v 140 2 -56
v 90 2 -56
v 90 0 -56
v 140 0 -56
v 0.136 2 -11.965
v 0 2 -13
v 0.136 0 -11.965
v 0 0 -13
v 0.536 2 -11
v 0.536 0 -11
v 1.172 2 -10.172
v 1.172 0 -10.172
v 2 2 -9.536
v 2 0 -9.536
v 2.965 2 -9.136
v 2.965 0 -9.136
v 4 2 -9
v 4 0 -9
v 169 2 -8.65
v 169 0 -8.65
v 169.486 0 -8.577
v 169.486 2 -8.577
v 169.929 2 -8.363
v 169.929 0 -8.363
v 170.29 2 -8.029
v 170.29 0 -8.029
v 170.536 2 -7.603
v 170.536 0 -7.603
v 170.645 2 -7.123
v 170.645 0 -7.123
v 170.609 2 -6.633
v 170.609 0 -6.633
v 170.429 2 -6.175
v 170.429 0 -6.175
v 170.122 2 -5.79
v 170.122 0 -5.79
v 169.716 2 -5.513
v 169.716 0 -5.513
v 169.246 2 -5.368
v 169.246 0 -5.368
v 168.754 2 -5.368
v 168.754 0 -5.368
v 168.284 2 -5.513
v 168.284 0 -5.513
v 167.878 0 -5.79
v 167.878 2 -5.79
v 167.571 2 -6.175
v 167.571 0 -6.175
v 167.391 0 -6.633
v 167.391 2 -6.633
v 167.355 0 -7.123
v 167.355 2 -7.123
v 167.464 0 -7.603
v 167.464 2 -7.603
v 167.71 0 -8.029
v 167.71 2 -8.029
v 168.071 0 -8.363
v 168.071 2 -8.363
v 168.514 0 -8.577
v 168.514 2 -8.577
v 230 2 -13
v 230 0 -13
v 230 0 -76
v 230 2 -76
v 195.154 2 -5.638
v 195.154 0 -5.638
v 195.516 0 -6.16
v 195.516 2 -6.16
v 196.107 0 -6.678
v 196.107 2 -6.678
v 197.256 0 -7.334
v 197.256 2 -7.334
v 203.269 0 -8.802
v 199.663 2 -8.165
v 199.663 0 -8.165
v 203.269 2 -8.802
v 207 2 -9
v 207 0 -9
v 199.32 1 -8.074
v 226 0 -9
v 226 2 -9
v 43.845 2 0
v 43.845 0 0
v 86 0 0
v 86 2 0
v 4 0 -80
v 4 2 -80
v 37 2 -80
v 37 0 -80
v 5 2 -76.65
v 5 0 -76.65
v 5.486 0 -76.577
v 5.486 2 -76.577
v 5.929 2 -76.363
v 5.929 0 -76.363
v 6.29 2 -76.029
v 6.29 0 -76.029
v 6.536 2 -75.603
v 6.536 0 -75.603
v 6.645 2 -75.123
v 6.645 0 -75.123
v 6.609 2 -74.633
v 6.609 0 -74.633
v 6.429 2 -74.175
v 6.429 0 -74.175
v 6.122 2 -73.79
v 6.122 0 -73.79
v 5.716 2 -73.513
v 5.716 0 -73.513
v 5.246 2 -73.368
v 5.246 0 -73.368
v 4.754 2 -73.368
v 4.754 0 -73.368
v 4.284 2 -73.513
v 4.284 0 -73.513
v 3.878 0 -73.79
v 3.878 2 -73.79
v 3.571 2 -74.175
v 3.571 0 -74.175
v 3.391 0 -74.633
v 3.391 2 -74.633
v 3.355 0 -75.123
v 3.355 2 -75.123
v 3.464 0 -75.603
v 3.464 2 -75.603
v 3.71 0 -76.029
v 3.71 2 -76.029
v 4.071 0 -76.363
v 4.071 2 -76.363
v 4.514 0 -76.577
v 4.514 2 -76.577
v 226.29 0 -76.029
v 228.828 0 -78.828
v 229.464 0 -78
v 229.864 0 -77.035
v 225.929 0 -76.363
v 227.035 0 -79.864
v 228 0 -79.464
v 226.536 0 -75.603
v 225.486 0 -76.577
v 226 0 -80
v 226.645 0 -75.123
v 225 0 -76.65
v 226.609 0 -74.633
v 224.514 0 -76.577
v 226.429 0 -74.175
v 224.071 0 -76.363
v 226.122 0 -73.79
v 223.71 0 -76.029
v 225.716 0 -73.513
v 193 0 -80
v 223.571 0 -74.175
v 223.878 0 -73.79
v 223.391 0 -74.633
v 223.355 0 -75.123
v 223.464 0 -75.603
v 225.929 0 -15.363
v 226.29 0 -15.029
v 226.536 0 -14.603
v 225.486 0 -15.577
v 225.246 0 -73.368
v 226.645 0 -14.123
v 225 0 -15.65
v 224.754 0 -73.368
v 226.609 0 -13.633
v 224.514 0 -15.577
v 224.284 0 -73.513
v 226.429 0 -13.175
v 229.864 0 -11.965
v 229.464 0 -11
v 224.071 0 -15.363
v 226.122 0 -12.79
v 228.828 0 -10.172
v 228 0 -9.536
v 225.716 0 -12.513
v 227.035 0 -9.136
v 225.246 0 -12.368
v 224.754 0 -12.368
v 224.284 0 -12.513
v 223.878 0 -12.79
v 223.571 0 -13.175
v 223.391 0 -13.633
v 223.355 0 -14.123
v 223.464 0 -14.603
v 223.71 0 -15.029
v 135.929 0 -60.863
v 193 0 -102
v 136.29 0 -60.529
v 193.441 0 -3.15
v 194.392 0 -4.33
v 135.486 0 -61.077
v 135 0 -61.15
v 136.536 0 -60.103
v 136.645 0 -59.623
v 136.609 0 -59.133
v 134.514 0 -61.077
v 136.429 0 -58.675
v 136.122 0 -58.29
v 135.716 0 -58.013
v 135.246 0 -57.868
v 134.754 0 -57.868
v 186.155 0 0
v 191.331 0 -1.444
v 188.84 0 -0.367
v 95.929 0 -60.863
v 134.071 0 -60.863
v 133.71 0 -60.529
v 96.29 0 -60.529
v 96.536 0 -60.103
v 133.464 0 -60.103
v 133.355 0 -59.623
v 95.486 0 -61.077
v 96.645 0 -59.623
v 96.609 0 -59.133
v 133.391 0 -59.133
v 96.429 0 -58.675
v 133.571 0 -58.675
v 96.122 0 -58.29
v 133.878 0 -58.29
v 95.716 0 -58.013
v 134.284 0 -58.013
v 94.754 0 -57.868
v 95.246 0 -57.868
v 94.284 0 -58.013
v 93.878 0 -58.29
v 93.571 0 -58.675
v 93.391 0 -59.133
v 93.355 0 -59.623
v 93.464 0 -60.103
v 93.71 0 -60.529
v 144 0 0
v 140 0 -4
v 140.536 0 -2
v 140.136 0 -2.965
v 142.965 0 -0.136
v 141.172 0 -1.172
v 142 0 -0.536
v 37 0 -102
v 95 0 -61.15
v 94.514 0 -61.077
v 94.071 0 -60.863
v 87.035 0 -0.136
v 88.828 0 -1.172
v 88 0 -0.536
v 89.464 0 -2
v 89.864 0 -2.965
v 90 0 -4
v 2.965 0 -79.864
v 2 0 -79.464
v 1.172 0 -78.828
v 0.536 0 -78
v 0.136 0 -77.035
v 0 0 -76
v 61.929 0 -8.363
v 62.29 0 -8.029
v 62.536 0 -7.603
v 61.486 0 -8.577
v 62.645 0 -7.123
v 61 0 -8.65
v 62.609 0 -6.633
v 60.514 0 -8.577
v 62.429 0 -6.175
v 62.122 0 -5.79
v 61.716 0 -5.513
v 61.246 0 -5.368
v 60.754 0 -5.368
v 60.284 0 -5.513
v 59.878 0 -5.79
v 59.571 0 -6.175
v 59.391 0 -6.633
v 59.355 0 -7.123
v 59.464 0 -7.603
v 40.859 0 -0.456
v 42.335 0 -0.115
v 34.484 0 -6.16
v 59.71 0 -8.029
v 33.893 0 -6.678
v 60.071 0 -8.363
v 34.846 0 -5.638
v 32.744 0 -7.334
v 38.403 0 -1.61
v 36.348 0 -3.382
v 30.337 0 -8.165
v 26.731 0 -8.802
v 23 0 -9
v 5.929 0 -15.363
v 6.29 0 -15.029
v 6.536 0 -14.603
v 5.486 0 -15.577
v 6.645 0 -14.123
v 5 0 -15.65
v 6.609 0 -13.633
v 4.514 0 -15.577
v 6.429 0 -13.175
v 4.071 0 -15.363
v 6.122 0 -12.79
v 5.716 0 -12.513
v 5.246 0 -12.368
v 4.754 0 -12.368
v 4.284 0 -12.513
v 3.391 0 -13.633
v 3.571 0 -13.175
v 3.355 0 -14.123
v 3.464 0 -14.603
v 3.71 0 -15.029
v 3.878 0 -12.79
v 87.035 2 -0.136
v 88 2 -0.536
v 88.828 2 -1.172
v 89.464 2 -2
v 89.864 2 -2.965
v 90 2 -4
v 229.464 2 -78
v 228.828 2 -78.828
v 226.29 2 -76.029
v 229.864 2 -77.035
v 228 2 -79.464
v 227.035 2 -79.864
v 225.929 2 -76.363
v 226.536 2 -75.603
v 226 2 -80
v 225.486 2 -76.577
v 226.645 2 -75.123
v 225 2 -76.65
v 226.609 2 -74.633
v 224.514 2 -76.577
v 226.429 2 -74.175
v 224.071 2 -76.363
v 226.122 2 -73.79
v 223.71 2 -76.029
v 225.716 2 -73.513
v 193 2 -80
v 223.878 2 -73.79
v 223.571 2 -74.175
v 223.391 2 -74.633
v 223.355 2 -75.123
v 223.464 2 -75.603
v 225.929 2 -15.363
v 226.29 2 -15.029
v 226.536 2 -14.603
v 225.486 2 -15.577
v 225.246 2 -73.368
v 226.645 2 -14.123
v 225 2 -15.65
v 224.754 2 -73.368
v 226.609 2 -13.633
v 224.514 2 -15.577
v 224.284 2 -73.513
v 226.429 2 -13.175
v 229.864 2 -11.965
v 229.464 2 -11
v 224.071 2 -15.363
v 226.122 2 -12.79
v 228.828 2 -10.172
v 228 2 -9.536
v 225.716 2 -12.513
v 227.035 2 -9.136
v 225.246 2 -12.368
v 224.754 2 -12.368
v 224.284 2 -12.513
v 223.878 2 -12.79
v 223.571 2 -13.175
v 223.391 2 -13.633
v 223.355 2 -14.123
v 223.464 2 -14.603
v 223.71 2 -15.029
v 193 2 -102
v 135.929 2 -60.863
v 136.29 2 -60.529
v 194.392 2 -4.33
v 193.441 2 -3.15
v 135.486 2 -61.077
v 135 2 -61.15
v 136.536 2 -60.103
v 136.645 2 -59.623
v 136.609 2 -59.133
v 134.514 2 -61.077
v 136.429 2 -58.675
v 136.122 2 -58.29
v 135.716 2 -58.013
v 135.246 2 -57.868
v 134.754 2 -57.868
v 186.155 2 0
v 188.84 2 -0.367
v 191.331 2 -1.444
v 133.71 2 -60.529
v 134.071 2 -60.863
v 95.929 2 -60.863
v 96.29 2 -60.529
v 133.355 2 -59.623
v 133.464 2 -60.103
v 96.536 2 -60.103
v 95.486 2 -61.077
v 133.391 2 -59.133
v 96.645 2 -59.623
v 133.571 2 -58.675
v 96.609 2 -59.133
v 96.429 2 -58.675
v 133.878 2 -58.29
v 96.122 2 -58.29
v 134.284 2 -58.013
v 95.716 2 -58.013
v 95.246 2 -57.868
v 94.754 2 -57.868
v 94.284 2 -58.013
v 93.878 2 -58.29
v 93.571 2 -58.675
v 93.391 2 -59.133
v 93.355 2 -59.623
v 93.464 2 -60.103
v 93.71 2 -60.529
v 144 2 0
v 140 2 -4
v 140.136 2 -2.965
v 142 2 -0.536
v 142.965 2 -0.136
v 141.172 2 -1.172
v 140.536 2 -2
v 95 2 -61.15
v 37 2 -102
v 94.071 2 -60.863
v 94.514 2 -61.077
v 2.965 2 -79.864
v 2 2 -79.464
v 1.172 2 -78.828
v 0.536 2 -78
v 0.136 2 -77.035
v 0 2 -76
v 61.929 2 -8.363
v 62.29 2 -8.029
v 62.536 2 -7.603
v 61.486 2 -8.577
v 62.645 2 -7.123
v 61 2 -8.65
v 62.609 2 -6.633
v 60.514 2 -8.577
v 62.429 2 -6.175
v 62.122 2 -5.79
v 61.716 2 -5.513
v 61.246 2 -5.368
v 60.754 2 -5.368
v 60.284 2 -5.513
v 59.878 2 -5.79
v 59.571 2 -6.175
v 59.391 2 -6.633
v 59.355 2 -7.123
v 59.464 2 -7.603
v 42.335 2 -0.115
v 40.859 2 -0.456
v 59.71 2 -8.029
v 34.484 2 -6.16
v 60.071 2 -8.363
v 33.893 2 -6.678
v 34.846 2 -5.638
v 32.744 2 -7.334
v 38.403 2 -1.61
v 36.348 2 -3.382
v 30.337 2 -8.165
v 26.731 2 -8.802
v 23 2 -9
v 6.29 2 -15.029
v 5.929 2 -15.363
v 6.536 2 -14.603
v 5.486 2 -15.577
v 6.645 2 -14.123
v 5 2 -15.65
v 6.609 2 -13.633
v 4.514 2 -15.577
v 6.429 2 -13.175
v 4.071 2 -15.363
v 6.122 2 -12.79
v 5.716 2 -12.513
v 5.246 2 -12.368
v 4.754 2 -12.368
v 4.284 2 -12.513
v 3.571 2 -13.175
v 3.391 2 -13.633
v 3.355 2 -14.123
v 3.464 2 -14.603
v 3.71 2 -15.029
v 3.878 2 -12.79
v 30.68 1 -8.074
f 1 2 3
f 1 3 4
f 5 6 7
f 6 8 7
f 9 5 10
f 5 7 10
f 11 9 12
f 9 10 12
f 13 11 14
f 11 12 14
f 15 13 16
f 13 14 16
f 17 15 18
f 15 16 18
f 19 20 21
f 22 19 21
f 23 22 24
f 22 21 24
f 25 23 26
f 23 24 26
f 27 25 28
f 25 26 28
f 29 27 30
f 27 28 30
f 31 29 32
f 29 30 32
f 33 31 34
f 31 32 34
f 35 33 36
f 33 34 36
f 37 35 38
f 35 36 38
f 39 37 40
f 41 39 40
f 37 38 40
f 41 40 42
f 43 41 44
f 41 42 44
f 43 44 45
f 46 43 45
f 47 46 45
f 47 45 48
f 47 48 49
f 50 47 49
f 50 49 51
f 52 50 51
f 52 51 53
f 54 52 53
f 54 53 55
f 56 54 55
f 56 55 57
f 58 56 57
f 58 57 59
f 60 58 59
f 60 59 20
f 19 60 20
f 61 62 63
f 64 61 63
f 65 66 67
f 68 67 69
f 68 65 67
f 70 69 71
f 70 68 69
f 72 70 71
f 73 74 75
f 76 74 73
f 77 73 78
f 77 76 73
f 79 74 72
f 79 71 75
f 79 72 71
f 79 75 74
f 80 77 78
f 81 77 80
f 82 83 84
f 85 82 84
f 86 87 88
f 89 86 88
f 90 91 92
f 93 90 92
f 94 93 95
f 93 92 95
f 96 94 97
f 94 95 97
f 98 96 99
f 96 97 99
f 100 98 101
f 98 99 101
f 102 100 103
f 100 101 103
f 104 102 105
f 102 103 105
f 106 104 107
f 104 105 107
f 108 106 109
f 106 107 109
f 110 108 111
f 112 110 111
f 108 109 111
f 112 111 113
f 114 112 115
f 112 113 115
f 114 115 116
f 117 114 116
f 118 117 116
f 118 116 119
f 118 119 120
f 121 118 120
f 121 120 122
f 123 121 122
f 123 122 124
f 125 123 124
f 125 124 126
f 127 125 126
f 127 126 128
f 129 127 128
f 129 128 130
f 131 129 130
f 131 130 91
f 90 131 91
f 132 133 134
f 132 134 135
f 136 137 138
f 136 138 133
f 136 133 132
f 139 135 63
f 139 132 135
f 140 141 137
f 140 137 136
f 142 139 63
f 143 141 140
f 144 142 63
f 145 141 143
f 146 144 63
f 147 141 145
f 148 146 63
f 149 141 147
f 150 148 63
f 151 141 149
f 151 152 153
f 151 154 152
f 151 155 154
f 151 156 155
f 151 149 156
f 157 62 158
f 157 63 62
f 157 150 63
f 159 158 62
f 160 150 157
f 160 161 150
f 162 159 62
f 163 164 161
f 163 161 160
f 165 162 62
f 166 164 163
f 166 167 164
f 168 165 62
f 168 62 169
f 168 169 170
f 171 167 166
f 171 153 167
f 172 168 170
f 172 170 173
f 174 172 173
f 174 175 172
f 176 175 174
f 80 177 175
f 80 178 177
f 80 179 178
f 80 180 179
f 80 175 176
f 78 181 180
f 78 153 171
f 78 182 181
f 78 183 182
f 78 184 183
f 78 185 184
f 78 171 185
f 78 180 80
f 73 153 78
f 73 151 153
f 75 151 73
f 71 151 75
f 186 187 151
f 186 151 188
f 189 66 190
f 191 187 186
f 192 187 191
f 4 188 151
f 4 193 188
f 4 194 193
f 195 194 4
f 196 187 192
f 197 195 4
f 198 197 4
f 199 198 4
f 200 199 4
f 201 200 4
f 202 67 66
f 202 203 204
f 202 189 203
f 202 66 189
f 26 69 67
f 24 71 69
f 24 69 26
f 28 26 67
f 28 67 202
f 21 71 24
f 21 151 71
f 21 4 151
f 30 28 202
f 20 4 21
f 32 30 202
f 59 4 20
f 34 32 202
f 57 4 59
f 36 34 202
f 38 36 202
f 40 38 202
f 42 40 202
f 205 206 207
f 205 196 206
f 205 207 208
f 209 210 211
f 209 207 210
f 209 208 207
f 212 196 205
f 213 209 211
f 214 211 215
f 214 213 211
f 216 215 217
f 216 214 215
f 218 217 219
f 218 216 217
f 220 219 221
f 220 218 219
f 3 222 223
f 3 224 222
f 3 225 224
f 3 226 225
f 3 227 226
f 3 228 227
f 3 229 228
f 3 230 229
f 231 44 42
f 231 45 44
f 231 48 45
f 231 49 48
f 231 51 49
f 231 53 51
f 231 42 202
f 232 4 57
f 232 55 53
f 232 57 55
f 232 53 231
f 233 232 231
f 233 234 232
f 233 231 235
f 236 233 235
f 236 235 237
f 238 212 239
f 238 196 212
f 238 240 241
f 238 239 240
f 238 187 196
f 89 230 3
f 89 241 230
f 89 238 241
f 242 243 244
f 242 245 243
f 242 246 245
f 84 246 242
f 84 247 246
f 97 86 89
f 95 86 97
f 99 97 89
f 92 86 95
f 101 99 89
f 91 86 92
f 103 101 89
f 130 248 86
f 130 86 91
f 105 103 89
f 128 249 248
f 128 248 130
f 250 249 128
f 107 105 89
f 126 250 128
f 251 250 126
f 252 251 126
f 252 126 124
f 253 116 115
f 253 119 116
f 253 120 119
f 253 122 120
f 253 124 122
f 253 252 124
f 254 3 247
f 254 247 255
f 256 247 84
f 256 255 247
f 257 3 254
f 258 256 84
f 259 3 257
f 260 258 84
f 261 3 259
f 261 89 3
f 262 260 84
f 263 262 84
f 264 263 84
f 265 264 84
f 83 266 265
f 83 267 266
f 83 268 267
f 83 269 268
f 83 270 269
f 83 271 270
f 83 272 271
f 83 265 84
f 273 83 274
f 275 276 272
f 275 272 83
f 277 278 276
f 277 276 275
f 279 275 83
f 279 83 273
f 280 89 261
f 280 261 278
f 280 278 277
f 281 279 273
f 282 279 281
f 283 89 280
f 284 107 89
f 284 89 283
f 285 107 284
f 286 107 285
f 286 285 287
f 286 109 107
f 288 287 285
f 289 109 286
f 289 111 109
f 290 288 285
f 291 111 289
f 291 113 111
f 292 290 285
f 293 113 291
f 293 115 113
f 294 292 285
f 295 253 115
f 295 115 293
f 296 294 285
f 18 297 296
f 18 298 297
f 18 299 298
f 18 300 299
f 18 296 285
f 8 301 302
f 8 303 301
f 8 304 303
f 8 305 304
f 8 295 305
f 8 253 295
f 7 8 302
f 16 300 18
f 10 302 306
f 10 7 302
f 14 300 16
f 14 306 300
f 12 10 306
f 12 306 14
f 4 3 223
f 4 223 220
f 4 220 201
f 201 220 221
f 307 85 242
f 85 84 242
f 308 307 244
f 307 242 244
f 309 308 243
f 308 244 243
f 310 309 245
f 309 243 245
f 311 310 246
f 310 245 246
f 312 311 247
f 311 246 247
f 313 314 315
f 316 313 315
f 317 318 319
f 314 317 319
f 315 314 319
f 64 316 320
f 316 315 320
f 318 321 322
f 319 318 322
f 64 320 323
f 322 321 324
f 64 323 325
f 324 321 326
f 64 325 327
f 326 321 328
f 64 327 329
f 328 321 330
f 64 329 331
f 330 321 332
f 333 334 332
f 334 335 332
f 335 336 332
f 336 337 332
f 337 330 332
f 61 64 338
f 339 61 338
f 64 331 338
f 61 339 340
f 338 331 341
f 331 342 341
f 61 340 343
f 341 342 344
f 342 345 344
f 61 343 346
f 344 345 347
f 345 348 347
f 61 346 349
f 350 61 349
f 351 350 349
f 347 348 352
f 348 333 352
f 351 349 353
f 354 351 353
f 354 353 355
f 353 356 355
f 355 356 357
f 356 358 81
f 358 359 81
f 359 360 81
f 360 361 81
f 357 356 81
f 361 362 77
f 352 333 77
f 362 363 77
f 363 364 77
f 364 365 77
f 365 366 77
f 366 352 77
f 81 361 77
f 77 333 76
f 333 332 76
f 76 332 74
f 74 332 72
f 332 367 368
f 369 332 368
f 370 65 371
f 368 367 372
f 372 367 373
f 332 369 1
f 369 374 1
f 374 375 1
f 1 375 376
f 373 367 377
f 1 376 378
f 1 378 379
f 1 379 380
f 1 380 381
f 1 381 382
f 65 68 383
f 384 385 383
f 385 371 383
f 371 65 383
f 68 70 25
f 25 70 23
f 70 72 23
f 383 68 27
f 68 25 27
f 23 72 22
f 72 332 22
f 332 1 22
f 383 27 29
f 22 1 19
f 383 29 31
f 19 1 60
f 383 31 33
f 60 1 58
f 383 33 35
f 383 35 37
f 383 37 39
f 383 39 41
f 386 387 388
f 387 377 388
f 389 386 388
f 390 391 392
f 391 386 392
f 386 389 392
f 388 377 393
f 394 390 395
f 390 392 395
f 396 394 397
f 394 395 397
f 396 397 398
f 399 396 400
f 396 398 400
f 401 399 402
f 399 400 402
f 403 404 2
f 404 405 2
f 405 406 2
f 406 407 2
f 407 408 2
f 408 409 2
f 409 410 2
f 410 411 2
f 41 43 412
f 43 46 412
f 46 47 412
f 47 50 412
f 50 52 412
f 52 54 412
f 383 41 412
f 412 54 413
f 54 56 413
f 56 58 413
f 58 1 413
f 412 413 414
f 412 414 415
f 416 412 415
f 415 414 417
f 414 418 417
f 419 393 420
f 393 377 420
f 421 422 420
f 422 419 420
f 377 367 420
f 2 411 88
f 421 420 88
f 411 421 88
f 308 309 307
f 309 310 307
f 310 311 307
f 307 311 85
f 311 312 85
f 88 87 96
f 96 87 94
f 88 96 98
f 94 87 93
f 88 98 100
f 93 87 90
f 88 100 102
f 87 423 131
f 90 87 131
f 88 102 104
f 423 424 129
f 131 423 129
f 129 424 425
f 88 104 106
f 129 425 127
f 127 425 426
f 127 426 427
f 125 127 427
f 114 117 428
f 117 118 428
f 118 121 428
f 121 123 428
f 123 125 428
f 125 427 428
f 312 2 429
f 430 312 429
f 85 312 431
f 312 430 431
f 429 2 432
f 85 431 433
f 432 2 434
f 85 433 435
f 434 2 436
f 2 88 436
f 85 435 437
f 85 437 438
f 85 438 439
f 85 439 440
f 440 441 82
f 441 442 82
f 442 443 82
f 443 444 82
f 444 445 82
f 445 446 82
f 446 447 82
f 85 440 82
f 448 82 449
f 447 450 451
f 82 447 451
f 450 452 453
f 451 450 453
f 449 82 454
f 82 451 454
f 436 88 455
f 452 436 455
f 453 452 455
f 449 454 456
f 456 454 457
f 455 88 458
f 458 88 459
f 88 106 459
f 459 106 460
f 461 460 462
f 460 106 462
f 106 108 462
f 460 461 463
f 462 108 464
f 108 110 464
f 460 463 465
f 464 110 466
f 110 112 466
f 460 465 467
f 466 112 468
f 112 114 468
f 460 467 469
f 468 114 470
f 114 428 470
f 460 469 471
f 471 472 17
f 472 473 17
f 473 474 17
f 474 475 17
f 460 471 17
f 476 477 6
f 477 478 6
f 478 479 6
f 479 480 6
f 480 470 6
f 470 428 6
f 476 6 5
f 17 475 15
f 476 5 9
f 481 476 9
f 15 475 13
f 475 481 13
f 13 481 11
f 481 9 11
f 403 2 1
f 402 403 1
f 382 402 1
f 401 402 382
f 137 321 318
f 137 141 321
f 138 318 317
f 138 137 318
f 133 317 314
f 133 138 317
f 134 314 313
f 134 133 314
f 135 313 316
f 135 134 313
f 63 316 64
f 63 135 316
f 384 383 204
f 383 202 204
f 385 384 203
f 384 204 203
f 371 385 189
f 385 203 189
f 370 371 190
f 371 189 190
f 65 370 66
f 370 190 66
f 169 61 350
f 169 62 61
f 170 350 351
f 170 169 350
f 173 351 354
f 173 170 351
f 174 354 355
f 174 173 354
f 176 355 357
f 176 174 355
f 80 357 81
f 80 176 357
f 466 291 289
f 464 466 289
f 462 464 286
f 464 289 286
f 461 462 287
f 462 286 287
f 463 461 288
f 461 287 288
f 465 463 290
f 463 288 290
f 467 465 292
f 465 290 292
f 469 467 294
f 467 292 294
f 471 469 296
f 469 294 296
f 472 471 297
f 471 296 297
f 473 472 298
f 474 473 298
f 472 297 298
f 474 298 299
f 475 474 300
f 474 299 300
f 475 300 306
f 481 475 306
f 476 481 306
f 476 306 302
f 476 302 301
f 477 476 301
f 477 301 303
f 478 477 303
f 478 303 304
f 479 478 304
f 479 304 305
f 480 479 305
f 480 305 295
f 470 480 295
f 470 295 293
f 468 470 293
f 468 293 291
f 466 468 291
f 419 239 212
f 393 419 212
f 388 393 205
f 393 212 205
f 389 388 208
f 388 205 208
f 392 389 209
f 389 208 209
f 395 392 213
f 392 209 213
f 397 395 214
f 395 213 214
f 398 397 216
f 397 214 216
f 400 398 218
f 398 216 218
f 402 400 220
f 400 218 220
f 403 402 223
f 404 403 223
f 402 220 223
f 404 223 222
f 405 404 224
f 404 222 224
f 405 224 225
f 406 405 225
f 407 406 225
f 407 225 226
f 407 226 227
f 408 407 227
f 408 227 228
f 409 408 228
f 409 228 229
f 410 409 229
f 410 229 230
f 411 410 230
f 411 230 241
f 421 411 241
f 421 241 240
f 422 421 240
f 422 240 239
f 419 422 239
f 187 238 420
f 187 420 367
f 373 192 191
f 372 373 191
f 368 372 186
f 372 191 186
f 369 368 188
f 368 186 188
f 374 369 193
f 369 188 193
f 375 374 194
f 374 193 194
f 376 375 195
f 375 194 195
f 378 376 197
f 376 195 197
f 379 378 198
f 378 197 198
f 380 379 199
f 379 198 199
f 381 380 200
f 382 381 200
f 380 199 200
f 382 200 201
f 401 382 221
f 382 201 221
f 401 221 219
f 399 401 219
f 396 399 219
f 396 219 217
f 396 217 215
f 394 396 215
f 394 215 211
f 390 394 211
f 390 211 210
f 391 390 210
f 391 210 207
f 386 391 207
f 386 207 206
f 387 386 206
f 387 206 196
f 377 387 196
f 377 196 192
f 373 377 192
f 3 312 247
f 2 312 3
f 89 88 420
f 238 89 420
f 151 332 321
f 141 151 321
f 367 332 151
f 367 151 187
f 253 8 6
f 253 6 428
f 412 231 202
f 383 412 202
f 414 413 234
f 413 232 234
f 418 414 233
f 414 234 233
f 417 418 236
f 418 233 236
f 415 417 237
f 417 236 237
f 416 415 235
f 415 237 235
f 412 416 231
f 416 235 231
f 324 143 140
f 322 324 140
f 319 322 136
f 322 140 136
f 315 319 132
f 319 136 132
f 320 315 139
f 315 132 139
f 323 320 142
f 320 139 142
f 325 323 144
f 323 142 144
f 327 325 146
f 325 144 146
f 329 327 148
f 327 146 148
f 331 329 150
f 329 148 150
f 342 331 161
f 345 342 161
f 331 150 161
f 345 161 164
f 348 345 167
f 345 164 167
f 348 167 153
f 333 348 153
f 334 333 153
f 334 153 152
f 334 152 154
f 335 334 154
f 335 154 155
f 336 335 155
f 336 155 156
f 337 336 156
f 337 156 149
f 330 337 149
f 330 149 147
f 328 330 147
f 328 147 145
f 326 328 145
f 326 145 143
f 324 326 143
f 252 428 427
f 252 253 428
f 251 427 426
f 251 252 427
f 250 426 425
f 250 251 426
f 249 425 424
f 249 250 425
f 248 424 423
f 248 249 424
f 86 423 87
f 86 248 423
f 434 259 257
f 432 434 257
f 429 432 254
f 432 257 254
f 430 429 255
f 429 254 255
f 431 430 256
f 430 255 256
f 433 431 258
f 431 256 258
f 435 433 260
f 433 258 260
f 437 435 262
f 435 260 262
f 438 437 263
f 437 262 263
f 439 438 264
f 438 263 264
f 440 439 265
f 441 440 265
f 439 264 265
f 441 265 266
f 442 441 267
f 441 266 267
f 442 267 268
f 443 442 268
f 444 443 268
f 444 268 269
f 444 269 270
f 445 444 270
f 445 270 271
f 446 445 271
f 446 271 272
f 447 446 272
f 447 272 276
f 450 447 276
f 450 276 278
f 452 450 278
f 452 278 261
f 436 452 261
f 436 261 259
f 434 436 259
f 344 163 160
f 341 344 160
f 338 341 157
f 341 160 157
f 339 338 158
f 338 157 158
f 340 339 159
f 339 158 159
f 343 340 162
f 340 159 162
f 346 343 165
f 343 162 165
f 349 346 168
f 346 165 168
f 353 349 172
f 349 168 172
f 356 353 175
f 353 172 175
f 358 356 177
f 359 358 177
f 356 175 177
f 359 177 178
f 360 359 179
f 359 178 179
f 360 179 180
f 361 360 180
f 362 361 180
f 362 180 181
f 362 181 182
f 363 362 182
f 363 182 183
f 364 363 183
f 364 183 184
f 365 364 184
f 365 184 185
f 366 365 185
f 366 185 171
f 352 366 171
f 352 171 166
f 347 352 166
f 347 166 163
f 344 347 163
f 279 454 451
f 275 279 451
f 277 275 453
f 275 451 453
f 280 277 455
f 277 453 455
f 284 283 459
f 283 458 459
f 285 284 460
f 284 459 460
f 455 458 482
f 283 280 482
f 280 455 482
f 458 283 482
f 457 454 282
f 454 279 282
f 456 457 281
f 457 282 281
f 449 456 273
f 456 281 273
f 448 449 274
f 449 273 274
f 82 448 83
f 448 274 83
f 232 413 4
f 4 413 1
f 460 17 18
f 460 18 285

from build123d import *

# Parameters (mm, degrees)
SKETCH1_W           = 230
SKETCH1_H           = 102
BOSS_EXTRUDE1_DEPTH = 2
SKETCH2_W           = 37
SKETCH2_H           = 22
SKETCH2_W_2         = 35
SKETCH2_H_2         = 9
SKETCH2_W_3         = 50
SKETCH2_H_3         = 56
CUT_EXTRUDE1_DEPTH  = 252.610810579
SKETCH3_R           = 1.65
CUT_EXTRUDE2_DEPTH  = 10
FILLET1_R           = 4
FILLET2_SIZE        = 4
FILLET2_SIZE_2      = 12
FILLET3_R           = 10
SKETCH4_R           = 1.65
CUT_EXTRUDE3_DEPTH  = 10


with BuildPart() as part:
    # Sketch1 → Boss-Extrude1 (new body)
    with BuildSketch(Plane(origin=(0, 0, 0), x_dir=(1, 0, 0), z_dir=(0, 1, 0))):
        with Locations((115, 51)):
            Rectangle(SKETCH1_W, SKETCH1_H)
    extrude(amount=BOSS_EXTRUDE1_DEPTH)

    # Sketch2 → Cut-Extrude1 (cut, through all)
    with BuildSketch(Plane(origin=(0, 2, 0), x_dir=(1, 0, 0), z_dir=(0, 1, 0))):
        with Locations((18.5, 91)):
            Rectangle(SKETCH2_W, SKETCH2_H)
        with Locations((17.5, 4.5)):
            Rectangle(SKETCH2_W_2, SKETCH2_H_2)
        with Locations((211.5, 91)):
            Rectangle(SKETCH2_W, SKETCH2_H)
        with Locations((212.5, 4.5)):
            Rectangle(SKETCH2_W_2, SKETCH2_H_2)
        with Locations((115, 28)):
            Rectangle(SKETCH2_W_3, SKETCH2_H_3)
    extrude(amount=-CUT_EXTRUDE1_DEPTH, mode=Mode.SUBTRACT)

    # Sketch3 → Cut-Extrude2 (cut)
    with BuildSketch(Plane.XZ):
        with Locations(Location((5, -14, 0), (0, 0, 270))):
            Circle(SKETCH3_R)
        with Locations(Location((5, -75, 0), (0, 0, 270))):
            Circle(SKETCH3_R)
        with Locations(Location((95, -59.5, 0), (0, 0, 270))):
            Circle(SKETCH3_R)
        with Locations(Location((135, -59.5, 0), (0, 0, 270))):
            Circle(SKETCH3_R)
        with Locations(Location((225, -14, 0), (0, 0, 270))):
            Circle(SKETCH3_R)
        with Locations(Location((225, -75, 0), (0, 0, 270))):
            Circle(SKETCH3_R)
    extrude(amount=-CUT_EXTRUDE2_DEPTH, mode=Mode.SUBTRACT)

    # Fillet1
    fillet1_edges = [part.edges().sort_by_distance(p)[0] for p in [
        (0, 1, -9),
        (230, 1, -80),
        (230, 1, -9),
        (90, 1, 0),
        (140, 1, 0),
        (0, 1, -80),
    ]]
    fillet(fillet1_edges, radius=FILLET1_R)

    # Fillet2
    # an asymmetric fillet: 12, 4 mm, written as the material it adds along each edge
    with BuildSketch(Plane(origin=(195, 2, -9), x_dir=(0, 0, 1), z_dir=(0, -1, 0))) as fillet2_piece_1:
        with BuildLine():
            Bezier((FILLET2_SIZE, 0), (0, 0), (0, -FILLET2_SIZE_2), weights=[1, 0.707106781, 1])
            Line((0, -FILLET2_SIZE_2), (0, 0))
            Line((0, 0), (FILLET2_SIZE, 0))
        make_face()
    extrude(amount=2)
    with BuildSketch(Plane(origin=(35, 2, -9), x_dir=(0, 0, 1), z_dir=(0, -1, 0))) as fillet2_piece_2:
        with BuildLine():
            Bezier((FILLET2_SIZE, 0), (0, 0), (0, FILLET2_SIZE_2), weights=[1, 0.707106781, 1])
            Line((0, FILLET2_SIZE_2), (0, 0))
            Line((0, 0), (FILLET2_SIZE, 0))
        make_face()
    extrude(amount=2)

    # Fillet3
    fillet3_edges = [part.edges().sort_by_distance(p)[0] for p in [
        (35, 1, 0),
        (195, 1, 0),
    ]]
    fillet(fillet3_edges, radius=FILLET3_R)

    # Sketch4 → Cut-Extrude3 (cut)
    with BuildSketch(Plane.XZ):
        with Locations(Location((61, -7, 0), (0, 0, 270))):
            Circle(SKETCH4_R)
        with Locations(Location((169, -7, 0), (0, 0, 270))):
            Circle(SKETCH4_R)
    extrude(amount=-CUT_EXTRUDE3_DEPTH, mode=Mode.SUBTRACT)


solid = part.part
